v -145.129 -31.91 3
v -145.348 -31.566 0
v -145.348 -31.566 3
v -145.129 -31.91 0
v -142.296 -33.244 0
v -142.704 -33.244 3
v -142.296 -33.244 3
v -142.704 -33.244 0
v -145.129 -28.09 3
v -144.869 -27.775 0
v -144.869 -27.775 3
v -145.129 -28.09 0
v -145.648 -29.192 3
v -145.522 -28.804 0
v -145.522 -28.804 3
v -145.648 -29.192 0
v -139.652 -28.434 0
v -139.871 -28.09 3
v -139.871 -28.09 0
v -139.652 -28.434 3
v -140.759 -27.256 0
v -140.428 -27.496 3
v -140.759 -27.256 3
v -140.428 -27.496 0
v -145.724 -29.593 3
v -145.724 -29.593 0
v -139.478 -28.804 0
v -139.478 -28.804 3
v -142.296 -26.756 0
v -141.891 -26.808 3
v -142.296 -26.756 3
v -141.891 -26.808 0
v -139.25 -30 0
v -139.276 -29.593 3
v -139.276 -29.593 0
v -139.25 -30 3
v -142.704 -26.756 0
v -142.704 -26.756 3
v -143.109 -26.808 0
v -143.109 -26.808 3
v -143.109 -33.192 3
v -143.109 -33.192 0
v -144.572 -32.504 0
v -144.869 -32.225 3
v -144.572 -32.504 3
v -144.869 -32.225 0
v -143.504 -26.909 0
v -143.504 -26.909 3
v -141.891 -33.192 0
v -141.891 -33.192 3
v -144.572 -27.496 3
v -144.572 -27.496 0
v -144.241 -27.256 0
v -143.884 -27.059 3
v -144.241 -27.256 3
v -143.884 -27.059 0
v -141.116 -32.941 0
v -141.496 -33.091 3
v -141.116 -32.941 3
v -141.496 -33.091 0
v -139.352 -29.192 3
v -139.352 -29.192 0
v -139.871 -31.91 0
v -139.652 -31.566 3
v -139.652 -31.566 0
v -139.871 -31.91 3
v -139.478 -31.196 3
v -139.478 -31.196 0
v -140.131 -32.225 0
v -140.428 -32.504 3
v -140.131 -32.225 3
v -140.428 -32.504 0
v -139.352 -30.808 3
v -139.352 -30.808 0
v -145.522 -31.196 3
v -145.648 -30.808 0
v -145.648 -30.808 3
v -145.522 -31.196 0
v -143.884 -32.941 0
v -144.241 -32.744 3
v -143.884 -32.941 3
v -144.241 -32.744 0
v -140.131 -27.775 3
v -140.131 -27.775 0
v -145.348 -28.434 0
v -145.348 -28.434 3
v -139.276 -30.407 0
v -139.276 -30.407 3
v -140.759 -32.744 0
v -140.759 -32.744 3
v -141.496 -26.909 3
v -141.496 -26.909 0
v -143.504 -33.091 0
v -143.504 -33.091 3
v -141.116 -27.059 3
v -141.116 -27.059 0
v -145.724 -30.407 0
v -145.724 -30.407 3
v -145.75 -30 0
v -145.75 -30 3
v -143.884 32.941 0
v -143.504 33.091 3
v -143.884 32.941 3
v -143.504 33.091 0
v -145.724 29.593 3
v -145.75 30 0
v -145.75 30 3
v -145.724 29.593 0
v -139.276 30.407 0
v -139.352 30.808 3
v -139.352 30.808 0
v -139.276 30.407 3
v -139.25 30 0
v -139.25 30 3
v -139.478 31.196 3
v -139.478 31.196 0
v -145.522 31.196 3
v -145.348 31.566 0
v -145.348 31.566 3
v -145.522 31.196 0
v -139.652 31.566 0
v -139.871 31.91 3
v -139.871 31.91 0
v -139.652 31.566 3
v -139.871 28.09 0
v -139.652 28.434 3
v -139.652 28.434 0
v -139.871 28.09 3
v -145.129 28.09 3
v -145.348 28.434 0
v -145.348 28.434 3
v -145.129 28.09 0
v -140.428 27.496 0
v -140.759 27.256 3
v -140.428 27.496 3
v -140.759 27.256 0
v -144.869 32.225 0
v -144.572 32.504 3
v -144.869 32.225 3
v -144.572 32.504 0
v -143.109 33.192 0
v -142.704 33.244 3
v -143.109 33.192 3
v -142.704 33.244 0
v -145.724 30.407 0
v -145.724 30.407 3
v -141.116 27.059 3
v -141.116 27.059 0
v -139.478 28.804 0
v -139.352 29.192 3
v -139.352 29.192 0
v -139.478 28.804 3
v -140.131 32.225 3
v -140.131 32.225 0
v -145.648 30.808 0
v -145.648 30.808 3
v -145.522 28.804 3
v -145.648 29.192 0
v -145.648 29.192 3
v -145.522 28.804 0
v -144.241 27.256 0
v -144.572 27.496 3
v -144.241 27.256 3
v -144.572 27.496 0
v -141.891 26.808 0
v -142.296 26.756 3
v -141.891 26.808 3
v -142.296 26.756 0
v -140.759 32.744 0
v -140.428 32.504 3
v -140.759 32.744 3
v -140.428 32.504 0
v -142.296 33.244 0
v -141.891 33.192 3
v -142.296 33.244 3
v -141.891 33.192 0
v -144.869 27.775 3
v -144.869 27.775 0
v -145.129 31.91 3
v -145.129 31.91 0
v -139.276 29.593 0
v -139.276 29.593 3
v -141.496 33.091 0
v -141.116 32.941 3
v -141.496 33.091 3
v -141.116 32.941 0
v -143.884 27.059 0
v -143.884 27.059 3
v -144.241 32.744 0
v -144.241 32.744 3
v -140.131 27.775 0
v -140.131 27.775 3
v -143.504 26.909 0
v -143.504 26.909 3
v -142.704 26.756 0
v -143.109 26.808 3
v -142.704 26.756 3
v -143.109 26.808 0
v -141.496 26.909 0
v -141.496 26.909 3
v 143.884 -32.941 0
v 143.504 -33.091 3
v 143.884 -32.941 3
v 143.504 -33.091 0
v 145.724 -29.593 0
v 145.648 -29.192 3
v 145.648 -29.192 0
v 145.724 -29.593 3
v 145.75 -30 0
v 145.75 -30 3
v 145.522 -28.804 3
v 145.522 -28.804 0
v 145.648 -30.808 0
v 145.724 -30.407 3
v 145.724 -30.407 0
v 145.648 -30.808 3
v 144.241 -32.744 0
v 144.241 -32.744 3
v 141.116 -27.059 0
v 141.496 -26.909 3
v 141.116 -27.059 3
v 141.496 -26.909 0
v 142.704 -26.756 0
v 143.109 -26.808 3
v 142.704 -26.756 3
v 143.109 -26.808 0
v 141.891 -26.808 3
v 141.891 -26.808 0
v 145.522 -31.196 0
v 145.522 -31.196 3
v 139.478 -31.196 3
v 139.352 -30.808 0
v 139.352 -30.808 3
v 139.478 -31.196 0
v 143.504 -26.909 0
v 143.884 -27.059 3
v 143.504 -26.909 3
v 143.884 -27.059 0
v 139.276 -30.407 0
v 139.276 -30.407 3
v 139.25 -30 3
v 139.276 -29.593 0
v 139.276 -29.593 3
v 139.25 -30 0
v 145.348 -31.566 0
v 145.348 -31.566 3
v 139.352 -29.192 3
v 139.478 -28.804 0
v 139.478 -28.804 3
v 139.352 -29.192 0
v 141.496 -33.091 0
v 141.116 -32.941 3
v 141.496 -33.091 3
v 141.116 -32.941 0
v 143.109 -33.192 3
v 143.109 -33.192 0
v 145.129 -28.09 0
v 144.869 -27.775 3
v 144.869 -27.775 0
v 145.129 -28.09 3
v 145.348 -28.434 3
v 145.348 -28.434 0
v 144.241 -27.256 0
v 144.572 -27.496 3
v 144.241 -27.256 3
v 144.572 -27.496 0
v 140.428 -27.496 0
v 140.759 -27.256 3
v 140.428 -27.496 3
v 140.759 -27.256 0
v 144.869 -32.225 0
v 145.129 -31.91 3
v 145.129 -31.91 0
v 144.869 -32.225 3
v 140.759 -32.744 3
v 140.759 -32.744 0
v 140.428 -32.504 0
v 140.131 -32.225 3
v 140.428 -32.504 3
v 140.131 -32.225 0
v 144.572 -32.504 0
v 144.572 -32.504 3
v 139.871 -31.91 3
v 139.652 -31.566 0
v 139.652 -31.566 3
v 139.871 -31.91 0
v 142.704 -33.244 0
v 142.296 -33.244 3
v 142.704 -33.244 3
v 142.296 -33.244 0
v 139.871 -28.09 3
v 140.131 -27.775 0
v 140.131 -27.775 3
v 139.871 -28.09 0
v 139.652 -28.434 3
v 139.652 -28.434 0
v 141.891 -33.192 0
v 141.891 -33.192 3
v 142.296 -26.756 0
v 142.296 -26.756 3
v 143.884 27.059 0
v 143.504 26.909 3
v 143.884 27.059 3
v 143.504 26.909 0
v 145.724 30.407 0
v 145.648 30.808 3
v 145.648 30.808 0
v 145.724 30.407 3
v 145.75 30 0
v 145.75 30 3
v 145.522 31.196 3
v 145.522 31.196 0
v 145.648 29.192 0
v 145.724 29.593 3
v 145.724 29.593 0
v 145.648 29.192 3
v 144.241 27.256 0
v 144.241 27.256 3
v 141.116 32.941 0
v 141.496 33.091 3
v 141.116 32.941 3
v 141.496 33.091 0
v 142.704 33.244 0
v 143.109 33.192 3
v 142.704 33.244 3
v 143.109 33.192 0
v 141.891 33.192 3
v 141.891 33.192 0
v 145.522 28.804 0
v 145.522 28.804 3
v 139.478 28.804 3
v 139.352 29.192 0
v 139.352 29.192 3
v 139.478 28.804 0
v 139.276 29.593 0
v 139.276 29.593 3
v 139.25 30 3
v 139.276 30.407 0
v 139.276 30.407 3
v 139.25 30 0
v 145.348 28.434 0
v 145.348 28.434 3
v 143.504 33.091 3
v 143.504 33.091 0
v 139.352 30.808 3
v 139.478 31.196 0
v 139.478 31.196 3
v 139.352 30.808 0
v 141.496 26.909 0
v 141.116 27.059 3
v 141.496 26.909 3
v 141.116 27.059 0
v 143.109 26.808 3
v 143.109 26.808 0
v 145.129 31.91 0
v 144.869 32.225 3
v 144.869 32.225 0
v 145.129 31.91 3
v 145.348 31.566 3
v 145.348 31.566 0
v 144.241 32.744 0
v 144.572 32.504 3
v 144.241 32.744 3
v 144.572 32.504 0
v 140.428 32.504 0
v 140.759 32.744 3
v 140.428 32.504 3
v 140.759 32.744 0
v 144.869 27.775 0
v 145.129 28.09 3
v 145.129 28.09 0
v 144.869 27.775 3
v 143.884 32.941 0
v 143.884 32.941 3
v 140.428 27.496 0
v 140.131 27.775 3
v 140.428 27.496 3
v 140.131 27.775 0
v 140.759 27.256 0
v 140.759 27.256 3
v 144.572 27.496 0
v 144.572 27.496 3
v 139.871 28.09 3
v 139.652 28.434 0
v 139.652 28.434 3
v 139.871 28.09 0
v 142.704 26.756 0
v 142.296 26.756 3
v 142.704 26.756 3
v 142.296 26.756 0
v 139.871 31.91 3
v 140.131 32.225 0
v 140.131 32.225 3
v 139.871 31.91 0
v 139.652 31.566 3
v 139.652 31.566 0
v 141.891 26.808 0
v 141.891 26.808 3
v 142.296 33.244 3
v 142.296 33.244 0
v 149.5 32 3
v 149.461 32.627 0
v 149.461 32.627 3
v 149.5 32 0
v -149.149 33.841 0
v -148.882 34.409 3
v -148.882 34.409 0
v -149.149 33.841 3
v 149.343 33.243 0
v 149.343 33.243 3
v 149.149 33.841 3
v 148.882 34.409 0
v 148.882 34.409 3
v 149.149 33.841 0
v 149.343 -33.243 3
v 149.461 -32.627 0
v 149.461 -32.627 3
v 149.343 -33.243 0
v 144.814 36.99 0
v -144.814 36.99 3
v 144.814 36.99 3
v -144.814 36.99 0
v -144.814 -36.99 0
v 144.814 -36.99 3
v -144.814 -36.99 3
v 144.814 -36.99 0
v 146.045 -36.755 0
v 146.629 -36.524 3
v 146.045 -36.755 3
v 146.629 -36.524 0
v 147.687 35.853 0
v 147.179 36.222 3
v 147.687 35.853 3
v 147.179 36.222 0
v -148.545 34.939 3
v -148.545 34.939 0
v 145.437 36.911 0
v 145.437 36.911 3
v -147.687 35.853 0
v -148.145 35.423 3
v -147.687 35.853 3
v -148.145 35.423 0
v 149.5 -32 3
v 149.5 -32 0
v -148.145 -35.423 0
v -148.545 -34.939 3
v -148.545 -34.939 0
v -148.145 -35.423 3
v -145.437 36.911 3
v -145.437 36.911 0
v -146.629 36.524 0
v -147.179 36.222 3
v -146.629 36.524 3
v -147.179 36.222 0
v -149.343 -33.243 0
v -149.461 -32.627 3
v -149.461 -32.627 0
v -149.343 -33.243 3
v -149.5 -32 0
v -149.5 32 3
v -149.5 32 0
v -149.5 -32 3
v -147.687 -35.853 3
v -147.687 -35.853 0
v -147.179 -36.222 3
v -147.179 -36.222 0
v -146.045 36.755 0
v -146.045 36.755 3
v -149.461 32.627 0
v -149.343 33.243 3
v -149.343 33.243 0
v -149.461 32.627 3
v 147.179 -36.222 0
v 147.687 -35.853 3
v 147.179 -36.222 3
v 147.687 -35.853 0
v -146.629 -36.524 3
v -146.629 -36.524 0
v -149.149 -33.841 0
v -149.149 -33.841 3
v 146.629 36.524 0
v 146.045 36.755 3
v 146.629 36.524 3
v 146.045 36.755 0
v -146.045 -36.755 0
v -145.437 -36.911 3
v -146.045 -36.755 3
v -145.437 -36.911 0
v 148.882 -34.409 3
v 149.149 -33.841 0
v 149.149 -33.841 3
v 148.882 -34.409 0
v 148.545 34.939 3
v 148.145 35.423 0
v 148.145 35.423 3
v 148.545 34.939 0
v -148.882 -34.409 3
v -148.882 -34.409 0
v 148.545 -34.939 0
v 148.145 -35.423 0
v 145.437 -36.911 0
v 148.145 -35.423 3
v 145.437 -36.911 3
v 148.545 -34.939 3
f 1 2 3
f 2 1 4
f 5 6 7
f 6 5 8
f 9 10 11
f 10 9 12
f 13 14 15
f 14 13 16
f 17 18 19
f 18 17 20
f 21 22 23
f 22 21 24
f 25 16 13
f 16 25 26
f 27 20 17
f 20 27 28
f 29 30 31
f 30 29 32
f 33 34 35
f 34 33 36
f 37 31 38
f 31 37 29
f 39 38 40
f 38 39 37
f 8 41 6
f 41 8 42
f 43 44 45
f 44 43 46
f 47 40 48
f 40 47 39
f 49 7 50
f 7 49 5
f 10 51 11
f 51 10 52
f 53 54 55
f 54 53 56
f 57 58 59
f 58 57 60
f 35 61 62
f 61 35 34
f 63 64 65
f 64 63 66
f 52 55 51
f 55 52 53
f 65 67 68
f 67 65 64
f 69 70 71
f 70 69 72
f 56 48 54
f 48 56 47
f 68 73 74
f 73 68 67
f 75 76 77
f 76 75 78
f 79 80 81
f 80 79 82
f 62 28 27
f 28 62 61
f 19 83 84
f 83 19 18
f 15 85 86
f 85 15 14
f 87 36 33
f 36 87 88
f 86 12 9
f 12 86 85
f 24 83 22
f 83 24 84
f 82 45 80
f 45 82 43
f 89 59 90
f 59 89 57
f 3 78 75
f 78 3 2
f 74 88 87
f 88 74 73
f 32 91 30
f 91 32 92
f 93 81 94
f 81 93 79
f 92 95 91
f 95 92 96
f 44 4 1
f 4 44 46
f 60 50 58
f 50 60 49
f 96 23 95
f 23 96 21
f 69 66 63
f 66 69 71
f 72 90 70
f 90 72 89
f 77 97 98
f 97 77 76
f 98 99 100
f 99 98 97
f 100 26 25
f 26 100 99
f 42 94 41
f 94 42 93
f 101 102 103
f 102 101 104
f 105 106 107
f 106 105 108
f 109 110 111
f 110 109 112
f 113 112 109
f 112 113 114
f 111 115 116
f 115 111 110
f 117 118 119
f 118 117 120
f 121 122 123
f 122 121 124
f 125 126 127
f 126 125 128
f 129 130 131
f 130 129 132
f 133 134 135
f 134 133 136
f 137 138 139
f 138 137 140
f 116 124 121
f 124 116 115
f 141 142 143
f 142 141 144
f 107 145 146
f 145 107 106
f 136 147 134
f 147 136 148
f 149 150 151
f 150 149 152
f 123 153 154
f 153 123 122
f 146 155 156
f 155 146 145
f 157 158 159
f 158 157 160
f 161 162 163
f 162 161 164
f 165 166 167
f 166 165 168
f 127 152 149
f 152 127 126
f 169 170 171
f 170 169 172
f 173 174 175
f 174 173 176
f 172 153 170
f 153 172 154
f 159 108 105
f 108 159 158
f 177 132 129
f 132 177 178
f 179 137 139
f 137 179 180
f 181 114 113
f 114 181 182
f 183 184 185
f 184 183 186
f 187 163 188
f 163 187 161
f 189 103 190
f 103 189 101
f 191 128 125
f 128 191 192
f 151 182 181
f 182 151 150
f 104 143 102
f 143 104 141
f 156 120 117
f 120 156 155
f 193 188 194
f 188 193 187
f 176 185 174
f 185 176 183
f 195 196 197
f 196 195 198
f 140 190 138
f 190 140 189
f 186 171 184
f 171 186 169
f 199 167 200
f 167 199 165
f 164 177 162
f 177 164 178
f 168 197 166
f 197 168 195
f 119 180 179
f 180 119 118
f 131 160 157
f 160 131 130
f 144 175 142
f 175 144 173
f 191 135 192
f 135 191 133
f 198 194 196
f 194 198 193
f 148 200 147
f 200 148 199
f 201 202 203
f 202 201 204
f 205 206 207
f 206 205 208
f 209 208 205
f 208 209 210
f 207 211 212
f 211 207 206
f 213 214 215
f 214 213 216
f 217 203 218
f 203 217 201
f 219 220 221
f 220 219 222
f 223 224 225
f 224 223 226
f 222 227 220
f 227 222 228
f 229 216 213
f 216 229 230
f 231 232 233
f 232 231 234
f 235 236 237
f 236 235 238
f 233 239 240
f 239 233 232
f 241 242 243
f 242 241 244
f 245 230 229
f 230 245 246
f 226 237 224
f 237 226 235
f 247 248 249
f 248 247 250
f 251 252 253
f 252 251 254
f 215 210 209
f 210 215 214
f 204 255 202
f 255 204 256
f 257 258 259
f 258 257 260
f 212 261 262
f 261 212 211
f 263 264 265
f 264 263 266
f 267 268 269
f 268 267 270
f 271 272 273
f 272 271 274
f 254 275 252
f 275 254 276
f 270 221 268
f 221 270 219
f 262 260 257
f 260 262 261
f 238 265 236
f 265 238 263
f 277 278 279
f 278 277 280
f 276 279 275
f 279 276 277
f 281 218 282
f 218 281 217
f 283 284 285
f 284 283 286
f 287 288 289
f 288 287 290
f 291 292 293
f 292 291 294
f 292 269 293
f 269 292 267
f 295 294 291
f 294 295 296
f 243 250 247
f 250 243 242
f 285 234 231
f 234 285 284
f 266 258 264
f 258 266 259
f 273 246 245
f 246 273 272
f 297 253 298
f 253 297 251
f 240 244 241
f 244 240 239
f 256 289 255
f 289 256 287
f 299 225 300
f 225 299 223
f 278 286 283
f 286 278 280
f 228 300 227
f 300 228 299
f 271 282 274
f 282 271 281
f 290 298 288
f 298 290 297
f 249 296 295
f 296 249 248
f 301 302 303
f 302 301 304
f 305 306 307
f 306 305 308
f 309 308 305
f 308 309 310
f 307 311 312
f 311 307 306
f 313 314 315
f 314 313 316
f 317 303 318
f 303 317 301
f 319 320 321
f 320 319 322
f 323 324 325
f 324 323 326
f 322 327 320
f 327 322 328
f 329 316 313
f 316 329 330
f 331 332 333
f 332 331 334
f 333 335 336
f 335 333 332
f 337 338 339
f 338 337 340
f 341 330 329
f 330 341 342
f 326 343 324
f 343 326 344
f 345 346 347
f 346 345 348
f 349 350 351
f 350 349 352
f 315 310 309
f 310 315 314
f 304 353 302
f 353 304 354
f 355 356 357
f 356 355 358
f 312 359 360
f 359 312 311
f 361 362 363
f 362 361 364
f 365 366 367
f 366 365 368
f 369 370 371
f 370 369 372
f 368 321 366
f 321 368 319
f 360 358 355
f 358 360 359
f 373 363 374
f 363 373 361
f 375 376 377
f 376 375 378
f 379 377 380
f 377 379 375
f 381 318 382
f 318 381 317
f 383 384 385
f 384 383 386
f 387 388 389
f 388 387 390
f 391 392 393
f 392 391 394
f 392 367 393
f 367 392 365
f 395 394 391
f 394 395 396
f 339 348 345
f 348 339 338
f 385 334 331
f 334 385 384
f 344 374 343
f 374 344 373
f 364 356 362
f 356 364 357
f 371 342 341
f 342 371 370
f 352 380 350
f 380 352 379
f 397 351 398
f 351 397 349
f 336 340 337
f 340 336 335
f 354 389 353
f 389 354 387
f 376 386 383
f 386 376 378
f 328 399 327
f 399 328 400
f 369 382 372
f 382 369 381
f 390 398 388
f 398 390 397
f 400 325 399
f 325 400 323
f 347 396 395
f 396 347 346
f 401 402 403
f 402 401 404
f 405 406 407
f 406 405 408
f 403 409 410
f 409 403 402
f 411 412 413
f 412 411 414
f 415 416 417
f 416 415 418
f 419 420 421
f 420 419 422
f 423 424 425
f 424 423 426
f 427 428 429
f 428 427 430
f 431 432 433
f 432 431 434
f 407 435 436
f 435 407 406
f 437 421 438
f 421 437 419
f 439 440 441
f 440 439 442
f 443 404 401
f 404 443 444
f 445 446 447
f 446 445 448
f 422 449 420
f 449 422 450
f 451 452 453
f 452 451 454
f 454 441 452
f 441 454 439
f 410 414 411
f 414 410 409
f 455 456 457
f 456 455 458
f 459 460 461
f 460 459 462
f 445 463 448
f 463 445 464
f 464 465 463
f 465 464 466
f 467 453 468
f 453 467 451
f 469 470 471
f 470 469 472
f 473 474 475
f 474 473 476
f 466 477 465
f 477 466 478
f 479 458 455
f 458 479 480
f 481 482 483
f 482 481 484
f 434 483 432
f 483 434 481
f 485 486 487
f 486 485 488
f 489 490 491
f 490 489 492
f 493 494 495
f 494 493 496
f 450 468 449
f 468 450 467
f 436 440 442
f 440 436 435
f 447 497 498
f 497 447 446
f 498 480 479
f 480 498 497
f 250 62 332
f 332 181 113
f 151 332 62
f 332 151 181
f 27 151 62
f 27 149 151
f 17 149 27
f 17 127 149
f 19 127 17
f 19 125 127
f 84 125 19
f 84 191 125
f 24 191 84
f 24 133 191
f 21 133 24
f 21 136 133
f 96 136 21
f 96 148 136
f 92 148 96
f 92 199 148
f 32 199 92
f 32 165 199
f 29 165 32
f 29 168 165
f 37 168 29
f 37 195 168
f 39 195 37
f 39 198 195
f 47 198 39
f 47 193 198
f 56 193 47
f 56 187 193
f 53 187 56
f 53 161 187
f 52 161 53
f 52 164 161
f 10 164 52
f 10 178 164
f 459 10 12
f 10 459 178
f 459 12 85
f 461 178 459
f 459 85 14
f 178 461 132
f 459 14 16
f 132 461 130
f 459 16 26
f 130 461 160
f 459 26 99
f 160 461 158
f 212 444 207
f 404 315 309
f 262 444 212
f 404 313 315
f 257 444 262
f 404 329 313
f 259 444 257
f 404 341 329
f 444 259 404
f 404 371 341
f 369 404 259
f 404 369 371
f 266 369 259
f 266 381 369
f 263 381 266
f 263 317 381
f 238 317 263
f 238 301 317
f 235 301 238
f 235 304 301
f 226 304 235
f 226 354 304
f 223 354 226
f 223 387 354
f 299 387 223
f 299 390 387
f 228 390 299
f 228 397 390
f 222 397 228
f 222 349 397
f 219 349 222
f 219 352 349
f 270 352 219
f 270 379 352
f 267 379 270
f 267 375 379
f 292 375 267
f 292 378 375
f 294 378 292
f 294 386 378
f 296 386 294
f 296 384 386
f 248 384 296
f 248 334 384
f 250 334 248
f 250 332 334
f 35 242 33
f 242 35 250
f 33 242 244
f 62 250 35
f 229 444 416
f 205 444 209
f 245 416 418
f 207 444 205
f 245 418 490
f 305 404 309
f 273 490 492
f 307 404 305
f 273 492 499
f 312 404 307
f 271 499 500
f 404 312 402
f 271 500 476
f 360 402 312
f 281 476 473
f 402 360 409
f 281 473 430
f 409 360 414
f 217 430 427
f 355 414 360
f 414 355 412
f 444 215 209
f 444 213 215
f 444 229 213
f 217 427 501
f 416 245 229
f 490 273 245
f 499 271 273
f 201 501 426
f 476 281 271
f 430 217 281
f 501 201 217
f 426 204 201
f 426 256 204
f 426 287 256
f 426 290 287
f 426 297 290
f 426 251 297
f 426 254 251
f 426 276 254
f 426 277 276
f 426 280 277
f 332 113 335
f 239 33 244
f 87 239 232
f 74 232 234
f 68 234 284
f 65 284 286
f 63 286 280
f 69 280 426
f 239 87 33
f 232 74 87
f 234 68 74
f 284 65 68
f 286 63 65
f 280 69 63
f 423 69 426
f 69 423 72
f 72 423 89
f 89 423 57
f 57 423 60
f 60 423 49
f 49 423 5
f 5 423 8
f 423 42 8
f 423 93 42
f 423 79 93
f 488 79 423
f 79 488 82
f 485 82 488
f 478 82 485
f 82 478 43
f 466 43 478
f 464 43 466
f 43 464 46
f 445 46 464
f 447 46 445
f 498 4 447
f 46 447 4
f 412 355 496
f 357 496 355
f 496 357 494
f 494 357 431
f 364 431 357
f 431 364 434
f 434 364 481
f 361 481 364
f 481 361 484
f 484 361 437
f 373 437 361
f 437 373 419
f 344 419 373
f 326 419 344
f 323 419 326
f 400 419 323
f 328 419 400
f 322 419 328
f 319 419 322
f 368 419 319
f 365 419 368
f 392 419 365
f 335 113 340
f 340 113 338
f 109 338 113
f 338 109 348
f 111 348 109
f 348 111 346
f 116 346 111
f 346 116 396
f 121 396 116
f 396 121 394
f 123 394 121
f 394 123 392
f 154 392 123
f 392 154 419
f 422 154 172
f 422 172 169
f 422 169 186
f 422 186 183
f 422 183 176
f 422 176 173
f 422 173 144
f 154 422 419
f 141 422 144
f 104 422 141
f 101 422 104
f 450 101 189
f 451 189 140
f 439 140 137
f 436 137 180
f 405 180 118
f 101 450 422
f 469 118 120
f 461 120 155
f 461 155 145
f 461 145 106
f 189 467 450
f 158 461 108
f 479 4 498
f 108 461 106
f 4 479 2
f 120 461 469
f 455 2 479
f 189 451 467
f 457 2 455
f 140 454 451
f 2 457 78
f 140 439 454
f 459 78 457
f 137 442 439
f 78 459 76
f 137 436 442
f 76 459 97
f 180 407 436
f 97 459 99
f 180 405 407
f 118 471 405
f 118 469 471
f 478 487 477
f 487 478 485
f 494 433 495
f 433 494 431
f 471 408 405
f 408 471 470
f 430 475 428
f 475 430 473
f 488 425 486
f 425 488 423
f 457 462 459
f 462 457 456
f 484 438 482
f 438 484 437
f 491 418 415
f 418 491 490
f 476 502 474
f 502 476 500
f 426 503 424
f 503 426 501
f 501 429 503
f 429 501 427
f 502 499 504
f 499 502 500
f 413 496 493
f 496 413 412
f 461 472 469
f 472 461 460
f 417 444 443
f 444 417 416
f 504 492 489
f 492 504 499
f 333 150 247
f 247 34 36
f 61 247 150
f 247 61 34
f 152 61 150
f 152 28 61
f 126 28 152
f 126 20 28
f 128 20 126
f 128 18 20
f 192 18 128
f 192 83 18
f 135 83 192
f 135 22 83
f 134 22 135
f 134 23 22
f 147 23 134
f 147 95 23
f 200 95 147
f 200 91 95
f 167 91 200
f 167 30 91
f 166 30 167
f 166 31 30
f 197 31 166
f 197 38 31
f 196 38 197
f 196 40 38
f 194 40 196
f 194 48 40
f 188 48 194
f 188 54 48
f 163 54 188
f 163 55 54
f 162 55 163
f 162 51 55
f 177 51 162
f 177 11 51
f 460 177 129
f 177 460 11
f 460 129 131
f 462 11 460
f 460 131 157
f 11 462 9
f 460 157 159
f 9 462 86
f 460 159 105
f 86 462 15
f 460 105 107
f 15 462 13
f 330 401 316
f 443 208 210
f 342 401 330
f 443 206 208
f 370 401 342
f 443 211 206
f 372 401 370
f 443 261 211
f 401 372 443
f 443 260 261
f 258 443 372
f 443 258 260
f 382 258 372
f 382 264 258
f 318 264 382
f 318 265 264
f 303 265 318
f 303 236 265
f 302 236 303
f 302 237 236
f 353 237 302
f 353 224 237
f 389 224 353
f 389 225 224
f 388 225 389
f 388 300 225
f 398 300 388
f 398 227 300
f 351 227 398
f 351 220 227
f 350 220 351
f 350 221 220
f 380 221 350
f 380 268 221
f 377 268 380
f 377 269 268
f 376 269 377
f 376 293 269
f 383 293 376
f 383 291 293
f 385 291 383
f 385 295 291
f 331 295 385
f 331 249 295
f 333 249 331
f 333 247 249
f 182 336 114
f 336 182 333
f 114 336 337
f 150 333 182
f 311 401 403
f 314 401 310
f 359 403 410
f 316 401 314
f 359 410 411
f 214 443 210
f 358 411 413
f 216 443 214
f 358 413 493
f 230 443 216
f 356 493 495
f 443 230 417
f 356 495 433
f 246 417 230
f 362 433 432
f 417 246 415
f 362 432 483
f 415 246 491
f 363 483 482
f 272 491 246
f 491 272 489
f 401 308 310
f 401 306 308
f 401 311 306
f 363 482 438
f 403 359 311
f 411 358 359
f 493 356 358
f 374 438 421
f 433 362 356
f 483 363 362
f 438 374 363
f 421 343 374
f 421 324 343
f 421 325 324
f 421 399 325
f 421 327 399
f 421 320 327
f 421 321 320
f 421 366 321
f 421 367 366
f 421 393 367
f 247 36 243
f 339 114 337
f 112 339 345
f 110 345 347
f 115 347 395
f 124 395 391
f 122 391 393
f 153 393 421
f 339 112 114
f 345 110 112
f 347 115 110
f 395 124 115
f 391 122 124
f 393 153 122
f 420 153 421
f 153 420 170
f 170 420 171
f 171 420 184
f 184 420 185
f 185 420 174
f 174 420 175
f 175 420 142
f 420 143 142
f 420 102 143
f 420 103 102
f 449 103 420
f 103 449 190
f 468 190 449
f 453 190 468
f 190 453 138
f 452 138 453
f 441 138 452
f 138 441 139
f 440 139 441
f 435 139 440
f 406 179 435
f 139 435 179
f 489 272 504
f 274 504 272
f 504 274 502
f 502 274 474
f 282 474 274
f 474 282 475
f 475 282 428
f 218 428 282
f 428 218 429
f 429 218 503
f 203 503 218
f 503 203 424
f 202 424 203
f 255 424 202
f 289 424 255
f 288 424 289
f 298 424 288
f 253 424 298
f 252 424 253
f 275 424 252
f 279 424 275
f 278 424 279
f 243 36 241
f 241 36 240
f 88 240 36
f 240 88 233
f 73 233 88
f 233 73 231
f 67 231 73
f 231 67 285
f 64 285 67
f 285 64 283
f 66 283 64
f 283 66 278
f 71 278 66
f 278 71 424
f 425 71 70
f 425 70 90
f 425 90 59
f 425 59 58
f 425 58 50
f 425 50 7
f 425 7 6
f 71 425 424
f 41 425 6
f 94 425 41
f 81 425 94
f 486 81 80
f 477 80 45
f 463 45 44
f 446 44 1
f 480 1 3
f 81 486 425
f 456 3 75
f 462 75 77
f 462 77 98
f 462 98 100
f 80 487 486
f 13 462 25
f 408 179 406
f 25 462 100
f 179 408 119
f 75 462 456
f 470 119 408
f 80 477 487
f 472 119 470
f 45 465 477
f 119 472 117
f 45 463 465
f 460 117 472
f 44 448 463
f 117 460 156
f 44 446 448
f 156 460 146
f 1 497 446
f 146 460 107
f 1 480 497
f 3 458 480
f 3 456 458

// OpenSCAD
$fn = 50;


difference() {
	union() {
		hull() {
			translate(v = [-144.5000000000, 32.0000000000, 0]) {
				cylinder(h = 3, r = 5);
			}
			translate(v = [144.5000000000, 32.0000000000, 0]) {
				cylinder(h = 3, r = 5);
			}
			translate(v = [-144.5000000000, -32.0000000000, 0]) {
				cylinder(h = 3, r = 5);
			}
			translate(v = [144.5000000000, -32.0000000000, 0]) {
				cylinder(h = 3, r = 5);
			}
		}
	}
	union() {
		translate(v = [-142.5000000000, -30.0000000000, -100.0000000000]) {
			cylinder(h = 200, r = 3.2500000000);
		}
		translate(v = [-142.5000000000, 30.0000000000, -100.0000000000]) {
			cylinder(h = 200, r = 3.2500000000);
		}
		translate(v = [142.5000000000, -30.0000000000, -100.0000000000]) {
			cylinder(h = 200, r = 3.2500000000);
		}
		translate(v = [142.5000000000, 30.0000000000, -100.0000000000]) {
			cylinder(h = 200, r = 3.2500000000);
		}
	}
}
